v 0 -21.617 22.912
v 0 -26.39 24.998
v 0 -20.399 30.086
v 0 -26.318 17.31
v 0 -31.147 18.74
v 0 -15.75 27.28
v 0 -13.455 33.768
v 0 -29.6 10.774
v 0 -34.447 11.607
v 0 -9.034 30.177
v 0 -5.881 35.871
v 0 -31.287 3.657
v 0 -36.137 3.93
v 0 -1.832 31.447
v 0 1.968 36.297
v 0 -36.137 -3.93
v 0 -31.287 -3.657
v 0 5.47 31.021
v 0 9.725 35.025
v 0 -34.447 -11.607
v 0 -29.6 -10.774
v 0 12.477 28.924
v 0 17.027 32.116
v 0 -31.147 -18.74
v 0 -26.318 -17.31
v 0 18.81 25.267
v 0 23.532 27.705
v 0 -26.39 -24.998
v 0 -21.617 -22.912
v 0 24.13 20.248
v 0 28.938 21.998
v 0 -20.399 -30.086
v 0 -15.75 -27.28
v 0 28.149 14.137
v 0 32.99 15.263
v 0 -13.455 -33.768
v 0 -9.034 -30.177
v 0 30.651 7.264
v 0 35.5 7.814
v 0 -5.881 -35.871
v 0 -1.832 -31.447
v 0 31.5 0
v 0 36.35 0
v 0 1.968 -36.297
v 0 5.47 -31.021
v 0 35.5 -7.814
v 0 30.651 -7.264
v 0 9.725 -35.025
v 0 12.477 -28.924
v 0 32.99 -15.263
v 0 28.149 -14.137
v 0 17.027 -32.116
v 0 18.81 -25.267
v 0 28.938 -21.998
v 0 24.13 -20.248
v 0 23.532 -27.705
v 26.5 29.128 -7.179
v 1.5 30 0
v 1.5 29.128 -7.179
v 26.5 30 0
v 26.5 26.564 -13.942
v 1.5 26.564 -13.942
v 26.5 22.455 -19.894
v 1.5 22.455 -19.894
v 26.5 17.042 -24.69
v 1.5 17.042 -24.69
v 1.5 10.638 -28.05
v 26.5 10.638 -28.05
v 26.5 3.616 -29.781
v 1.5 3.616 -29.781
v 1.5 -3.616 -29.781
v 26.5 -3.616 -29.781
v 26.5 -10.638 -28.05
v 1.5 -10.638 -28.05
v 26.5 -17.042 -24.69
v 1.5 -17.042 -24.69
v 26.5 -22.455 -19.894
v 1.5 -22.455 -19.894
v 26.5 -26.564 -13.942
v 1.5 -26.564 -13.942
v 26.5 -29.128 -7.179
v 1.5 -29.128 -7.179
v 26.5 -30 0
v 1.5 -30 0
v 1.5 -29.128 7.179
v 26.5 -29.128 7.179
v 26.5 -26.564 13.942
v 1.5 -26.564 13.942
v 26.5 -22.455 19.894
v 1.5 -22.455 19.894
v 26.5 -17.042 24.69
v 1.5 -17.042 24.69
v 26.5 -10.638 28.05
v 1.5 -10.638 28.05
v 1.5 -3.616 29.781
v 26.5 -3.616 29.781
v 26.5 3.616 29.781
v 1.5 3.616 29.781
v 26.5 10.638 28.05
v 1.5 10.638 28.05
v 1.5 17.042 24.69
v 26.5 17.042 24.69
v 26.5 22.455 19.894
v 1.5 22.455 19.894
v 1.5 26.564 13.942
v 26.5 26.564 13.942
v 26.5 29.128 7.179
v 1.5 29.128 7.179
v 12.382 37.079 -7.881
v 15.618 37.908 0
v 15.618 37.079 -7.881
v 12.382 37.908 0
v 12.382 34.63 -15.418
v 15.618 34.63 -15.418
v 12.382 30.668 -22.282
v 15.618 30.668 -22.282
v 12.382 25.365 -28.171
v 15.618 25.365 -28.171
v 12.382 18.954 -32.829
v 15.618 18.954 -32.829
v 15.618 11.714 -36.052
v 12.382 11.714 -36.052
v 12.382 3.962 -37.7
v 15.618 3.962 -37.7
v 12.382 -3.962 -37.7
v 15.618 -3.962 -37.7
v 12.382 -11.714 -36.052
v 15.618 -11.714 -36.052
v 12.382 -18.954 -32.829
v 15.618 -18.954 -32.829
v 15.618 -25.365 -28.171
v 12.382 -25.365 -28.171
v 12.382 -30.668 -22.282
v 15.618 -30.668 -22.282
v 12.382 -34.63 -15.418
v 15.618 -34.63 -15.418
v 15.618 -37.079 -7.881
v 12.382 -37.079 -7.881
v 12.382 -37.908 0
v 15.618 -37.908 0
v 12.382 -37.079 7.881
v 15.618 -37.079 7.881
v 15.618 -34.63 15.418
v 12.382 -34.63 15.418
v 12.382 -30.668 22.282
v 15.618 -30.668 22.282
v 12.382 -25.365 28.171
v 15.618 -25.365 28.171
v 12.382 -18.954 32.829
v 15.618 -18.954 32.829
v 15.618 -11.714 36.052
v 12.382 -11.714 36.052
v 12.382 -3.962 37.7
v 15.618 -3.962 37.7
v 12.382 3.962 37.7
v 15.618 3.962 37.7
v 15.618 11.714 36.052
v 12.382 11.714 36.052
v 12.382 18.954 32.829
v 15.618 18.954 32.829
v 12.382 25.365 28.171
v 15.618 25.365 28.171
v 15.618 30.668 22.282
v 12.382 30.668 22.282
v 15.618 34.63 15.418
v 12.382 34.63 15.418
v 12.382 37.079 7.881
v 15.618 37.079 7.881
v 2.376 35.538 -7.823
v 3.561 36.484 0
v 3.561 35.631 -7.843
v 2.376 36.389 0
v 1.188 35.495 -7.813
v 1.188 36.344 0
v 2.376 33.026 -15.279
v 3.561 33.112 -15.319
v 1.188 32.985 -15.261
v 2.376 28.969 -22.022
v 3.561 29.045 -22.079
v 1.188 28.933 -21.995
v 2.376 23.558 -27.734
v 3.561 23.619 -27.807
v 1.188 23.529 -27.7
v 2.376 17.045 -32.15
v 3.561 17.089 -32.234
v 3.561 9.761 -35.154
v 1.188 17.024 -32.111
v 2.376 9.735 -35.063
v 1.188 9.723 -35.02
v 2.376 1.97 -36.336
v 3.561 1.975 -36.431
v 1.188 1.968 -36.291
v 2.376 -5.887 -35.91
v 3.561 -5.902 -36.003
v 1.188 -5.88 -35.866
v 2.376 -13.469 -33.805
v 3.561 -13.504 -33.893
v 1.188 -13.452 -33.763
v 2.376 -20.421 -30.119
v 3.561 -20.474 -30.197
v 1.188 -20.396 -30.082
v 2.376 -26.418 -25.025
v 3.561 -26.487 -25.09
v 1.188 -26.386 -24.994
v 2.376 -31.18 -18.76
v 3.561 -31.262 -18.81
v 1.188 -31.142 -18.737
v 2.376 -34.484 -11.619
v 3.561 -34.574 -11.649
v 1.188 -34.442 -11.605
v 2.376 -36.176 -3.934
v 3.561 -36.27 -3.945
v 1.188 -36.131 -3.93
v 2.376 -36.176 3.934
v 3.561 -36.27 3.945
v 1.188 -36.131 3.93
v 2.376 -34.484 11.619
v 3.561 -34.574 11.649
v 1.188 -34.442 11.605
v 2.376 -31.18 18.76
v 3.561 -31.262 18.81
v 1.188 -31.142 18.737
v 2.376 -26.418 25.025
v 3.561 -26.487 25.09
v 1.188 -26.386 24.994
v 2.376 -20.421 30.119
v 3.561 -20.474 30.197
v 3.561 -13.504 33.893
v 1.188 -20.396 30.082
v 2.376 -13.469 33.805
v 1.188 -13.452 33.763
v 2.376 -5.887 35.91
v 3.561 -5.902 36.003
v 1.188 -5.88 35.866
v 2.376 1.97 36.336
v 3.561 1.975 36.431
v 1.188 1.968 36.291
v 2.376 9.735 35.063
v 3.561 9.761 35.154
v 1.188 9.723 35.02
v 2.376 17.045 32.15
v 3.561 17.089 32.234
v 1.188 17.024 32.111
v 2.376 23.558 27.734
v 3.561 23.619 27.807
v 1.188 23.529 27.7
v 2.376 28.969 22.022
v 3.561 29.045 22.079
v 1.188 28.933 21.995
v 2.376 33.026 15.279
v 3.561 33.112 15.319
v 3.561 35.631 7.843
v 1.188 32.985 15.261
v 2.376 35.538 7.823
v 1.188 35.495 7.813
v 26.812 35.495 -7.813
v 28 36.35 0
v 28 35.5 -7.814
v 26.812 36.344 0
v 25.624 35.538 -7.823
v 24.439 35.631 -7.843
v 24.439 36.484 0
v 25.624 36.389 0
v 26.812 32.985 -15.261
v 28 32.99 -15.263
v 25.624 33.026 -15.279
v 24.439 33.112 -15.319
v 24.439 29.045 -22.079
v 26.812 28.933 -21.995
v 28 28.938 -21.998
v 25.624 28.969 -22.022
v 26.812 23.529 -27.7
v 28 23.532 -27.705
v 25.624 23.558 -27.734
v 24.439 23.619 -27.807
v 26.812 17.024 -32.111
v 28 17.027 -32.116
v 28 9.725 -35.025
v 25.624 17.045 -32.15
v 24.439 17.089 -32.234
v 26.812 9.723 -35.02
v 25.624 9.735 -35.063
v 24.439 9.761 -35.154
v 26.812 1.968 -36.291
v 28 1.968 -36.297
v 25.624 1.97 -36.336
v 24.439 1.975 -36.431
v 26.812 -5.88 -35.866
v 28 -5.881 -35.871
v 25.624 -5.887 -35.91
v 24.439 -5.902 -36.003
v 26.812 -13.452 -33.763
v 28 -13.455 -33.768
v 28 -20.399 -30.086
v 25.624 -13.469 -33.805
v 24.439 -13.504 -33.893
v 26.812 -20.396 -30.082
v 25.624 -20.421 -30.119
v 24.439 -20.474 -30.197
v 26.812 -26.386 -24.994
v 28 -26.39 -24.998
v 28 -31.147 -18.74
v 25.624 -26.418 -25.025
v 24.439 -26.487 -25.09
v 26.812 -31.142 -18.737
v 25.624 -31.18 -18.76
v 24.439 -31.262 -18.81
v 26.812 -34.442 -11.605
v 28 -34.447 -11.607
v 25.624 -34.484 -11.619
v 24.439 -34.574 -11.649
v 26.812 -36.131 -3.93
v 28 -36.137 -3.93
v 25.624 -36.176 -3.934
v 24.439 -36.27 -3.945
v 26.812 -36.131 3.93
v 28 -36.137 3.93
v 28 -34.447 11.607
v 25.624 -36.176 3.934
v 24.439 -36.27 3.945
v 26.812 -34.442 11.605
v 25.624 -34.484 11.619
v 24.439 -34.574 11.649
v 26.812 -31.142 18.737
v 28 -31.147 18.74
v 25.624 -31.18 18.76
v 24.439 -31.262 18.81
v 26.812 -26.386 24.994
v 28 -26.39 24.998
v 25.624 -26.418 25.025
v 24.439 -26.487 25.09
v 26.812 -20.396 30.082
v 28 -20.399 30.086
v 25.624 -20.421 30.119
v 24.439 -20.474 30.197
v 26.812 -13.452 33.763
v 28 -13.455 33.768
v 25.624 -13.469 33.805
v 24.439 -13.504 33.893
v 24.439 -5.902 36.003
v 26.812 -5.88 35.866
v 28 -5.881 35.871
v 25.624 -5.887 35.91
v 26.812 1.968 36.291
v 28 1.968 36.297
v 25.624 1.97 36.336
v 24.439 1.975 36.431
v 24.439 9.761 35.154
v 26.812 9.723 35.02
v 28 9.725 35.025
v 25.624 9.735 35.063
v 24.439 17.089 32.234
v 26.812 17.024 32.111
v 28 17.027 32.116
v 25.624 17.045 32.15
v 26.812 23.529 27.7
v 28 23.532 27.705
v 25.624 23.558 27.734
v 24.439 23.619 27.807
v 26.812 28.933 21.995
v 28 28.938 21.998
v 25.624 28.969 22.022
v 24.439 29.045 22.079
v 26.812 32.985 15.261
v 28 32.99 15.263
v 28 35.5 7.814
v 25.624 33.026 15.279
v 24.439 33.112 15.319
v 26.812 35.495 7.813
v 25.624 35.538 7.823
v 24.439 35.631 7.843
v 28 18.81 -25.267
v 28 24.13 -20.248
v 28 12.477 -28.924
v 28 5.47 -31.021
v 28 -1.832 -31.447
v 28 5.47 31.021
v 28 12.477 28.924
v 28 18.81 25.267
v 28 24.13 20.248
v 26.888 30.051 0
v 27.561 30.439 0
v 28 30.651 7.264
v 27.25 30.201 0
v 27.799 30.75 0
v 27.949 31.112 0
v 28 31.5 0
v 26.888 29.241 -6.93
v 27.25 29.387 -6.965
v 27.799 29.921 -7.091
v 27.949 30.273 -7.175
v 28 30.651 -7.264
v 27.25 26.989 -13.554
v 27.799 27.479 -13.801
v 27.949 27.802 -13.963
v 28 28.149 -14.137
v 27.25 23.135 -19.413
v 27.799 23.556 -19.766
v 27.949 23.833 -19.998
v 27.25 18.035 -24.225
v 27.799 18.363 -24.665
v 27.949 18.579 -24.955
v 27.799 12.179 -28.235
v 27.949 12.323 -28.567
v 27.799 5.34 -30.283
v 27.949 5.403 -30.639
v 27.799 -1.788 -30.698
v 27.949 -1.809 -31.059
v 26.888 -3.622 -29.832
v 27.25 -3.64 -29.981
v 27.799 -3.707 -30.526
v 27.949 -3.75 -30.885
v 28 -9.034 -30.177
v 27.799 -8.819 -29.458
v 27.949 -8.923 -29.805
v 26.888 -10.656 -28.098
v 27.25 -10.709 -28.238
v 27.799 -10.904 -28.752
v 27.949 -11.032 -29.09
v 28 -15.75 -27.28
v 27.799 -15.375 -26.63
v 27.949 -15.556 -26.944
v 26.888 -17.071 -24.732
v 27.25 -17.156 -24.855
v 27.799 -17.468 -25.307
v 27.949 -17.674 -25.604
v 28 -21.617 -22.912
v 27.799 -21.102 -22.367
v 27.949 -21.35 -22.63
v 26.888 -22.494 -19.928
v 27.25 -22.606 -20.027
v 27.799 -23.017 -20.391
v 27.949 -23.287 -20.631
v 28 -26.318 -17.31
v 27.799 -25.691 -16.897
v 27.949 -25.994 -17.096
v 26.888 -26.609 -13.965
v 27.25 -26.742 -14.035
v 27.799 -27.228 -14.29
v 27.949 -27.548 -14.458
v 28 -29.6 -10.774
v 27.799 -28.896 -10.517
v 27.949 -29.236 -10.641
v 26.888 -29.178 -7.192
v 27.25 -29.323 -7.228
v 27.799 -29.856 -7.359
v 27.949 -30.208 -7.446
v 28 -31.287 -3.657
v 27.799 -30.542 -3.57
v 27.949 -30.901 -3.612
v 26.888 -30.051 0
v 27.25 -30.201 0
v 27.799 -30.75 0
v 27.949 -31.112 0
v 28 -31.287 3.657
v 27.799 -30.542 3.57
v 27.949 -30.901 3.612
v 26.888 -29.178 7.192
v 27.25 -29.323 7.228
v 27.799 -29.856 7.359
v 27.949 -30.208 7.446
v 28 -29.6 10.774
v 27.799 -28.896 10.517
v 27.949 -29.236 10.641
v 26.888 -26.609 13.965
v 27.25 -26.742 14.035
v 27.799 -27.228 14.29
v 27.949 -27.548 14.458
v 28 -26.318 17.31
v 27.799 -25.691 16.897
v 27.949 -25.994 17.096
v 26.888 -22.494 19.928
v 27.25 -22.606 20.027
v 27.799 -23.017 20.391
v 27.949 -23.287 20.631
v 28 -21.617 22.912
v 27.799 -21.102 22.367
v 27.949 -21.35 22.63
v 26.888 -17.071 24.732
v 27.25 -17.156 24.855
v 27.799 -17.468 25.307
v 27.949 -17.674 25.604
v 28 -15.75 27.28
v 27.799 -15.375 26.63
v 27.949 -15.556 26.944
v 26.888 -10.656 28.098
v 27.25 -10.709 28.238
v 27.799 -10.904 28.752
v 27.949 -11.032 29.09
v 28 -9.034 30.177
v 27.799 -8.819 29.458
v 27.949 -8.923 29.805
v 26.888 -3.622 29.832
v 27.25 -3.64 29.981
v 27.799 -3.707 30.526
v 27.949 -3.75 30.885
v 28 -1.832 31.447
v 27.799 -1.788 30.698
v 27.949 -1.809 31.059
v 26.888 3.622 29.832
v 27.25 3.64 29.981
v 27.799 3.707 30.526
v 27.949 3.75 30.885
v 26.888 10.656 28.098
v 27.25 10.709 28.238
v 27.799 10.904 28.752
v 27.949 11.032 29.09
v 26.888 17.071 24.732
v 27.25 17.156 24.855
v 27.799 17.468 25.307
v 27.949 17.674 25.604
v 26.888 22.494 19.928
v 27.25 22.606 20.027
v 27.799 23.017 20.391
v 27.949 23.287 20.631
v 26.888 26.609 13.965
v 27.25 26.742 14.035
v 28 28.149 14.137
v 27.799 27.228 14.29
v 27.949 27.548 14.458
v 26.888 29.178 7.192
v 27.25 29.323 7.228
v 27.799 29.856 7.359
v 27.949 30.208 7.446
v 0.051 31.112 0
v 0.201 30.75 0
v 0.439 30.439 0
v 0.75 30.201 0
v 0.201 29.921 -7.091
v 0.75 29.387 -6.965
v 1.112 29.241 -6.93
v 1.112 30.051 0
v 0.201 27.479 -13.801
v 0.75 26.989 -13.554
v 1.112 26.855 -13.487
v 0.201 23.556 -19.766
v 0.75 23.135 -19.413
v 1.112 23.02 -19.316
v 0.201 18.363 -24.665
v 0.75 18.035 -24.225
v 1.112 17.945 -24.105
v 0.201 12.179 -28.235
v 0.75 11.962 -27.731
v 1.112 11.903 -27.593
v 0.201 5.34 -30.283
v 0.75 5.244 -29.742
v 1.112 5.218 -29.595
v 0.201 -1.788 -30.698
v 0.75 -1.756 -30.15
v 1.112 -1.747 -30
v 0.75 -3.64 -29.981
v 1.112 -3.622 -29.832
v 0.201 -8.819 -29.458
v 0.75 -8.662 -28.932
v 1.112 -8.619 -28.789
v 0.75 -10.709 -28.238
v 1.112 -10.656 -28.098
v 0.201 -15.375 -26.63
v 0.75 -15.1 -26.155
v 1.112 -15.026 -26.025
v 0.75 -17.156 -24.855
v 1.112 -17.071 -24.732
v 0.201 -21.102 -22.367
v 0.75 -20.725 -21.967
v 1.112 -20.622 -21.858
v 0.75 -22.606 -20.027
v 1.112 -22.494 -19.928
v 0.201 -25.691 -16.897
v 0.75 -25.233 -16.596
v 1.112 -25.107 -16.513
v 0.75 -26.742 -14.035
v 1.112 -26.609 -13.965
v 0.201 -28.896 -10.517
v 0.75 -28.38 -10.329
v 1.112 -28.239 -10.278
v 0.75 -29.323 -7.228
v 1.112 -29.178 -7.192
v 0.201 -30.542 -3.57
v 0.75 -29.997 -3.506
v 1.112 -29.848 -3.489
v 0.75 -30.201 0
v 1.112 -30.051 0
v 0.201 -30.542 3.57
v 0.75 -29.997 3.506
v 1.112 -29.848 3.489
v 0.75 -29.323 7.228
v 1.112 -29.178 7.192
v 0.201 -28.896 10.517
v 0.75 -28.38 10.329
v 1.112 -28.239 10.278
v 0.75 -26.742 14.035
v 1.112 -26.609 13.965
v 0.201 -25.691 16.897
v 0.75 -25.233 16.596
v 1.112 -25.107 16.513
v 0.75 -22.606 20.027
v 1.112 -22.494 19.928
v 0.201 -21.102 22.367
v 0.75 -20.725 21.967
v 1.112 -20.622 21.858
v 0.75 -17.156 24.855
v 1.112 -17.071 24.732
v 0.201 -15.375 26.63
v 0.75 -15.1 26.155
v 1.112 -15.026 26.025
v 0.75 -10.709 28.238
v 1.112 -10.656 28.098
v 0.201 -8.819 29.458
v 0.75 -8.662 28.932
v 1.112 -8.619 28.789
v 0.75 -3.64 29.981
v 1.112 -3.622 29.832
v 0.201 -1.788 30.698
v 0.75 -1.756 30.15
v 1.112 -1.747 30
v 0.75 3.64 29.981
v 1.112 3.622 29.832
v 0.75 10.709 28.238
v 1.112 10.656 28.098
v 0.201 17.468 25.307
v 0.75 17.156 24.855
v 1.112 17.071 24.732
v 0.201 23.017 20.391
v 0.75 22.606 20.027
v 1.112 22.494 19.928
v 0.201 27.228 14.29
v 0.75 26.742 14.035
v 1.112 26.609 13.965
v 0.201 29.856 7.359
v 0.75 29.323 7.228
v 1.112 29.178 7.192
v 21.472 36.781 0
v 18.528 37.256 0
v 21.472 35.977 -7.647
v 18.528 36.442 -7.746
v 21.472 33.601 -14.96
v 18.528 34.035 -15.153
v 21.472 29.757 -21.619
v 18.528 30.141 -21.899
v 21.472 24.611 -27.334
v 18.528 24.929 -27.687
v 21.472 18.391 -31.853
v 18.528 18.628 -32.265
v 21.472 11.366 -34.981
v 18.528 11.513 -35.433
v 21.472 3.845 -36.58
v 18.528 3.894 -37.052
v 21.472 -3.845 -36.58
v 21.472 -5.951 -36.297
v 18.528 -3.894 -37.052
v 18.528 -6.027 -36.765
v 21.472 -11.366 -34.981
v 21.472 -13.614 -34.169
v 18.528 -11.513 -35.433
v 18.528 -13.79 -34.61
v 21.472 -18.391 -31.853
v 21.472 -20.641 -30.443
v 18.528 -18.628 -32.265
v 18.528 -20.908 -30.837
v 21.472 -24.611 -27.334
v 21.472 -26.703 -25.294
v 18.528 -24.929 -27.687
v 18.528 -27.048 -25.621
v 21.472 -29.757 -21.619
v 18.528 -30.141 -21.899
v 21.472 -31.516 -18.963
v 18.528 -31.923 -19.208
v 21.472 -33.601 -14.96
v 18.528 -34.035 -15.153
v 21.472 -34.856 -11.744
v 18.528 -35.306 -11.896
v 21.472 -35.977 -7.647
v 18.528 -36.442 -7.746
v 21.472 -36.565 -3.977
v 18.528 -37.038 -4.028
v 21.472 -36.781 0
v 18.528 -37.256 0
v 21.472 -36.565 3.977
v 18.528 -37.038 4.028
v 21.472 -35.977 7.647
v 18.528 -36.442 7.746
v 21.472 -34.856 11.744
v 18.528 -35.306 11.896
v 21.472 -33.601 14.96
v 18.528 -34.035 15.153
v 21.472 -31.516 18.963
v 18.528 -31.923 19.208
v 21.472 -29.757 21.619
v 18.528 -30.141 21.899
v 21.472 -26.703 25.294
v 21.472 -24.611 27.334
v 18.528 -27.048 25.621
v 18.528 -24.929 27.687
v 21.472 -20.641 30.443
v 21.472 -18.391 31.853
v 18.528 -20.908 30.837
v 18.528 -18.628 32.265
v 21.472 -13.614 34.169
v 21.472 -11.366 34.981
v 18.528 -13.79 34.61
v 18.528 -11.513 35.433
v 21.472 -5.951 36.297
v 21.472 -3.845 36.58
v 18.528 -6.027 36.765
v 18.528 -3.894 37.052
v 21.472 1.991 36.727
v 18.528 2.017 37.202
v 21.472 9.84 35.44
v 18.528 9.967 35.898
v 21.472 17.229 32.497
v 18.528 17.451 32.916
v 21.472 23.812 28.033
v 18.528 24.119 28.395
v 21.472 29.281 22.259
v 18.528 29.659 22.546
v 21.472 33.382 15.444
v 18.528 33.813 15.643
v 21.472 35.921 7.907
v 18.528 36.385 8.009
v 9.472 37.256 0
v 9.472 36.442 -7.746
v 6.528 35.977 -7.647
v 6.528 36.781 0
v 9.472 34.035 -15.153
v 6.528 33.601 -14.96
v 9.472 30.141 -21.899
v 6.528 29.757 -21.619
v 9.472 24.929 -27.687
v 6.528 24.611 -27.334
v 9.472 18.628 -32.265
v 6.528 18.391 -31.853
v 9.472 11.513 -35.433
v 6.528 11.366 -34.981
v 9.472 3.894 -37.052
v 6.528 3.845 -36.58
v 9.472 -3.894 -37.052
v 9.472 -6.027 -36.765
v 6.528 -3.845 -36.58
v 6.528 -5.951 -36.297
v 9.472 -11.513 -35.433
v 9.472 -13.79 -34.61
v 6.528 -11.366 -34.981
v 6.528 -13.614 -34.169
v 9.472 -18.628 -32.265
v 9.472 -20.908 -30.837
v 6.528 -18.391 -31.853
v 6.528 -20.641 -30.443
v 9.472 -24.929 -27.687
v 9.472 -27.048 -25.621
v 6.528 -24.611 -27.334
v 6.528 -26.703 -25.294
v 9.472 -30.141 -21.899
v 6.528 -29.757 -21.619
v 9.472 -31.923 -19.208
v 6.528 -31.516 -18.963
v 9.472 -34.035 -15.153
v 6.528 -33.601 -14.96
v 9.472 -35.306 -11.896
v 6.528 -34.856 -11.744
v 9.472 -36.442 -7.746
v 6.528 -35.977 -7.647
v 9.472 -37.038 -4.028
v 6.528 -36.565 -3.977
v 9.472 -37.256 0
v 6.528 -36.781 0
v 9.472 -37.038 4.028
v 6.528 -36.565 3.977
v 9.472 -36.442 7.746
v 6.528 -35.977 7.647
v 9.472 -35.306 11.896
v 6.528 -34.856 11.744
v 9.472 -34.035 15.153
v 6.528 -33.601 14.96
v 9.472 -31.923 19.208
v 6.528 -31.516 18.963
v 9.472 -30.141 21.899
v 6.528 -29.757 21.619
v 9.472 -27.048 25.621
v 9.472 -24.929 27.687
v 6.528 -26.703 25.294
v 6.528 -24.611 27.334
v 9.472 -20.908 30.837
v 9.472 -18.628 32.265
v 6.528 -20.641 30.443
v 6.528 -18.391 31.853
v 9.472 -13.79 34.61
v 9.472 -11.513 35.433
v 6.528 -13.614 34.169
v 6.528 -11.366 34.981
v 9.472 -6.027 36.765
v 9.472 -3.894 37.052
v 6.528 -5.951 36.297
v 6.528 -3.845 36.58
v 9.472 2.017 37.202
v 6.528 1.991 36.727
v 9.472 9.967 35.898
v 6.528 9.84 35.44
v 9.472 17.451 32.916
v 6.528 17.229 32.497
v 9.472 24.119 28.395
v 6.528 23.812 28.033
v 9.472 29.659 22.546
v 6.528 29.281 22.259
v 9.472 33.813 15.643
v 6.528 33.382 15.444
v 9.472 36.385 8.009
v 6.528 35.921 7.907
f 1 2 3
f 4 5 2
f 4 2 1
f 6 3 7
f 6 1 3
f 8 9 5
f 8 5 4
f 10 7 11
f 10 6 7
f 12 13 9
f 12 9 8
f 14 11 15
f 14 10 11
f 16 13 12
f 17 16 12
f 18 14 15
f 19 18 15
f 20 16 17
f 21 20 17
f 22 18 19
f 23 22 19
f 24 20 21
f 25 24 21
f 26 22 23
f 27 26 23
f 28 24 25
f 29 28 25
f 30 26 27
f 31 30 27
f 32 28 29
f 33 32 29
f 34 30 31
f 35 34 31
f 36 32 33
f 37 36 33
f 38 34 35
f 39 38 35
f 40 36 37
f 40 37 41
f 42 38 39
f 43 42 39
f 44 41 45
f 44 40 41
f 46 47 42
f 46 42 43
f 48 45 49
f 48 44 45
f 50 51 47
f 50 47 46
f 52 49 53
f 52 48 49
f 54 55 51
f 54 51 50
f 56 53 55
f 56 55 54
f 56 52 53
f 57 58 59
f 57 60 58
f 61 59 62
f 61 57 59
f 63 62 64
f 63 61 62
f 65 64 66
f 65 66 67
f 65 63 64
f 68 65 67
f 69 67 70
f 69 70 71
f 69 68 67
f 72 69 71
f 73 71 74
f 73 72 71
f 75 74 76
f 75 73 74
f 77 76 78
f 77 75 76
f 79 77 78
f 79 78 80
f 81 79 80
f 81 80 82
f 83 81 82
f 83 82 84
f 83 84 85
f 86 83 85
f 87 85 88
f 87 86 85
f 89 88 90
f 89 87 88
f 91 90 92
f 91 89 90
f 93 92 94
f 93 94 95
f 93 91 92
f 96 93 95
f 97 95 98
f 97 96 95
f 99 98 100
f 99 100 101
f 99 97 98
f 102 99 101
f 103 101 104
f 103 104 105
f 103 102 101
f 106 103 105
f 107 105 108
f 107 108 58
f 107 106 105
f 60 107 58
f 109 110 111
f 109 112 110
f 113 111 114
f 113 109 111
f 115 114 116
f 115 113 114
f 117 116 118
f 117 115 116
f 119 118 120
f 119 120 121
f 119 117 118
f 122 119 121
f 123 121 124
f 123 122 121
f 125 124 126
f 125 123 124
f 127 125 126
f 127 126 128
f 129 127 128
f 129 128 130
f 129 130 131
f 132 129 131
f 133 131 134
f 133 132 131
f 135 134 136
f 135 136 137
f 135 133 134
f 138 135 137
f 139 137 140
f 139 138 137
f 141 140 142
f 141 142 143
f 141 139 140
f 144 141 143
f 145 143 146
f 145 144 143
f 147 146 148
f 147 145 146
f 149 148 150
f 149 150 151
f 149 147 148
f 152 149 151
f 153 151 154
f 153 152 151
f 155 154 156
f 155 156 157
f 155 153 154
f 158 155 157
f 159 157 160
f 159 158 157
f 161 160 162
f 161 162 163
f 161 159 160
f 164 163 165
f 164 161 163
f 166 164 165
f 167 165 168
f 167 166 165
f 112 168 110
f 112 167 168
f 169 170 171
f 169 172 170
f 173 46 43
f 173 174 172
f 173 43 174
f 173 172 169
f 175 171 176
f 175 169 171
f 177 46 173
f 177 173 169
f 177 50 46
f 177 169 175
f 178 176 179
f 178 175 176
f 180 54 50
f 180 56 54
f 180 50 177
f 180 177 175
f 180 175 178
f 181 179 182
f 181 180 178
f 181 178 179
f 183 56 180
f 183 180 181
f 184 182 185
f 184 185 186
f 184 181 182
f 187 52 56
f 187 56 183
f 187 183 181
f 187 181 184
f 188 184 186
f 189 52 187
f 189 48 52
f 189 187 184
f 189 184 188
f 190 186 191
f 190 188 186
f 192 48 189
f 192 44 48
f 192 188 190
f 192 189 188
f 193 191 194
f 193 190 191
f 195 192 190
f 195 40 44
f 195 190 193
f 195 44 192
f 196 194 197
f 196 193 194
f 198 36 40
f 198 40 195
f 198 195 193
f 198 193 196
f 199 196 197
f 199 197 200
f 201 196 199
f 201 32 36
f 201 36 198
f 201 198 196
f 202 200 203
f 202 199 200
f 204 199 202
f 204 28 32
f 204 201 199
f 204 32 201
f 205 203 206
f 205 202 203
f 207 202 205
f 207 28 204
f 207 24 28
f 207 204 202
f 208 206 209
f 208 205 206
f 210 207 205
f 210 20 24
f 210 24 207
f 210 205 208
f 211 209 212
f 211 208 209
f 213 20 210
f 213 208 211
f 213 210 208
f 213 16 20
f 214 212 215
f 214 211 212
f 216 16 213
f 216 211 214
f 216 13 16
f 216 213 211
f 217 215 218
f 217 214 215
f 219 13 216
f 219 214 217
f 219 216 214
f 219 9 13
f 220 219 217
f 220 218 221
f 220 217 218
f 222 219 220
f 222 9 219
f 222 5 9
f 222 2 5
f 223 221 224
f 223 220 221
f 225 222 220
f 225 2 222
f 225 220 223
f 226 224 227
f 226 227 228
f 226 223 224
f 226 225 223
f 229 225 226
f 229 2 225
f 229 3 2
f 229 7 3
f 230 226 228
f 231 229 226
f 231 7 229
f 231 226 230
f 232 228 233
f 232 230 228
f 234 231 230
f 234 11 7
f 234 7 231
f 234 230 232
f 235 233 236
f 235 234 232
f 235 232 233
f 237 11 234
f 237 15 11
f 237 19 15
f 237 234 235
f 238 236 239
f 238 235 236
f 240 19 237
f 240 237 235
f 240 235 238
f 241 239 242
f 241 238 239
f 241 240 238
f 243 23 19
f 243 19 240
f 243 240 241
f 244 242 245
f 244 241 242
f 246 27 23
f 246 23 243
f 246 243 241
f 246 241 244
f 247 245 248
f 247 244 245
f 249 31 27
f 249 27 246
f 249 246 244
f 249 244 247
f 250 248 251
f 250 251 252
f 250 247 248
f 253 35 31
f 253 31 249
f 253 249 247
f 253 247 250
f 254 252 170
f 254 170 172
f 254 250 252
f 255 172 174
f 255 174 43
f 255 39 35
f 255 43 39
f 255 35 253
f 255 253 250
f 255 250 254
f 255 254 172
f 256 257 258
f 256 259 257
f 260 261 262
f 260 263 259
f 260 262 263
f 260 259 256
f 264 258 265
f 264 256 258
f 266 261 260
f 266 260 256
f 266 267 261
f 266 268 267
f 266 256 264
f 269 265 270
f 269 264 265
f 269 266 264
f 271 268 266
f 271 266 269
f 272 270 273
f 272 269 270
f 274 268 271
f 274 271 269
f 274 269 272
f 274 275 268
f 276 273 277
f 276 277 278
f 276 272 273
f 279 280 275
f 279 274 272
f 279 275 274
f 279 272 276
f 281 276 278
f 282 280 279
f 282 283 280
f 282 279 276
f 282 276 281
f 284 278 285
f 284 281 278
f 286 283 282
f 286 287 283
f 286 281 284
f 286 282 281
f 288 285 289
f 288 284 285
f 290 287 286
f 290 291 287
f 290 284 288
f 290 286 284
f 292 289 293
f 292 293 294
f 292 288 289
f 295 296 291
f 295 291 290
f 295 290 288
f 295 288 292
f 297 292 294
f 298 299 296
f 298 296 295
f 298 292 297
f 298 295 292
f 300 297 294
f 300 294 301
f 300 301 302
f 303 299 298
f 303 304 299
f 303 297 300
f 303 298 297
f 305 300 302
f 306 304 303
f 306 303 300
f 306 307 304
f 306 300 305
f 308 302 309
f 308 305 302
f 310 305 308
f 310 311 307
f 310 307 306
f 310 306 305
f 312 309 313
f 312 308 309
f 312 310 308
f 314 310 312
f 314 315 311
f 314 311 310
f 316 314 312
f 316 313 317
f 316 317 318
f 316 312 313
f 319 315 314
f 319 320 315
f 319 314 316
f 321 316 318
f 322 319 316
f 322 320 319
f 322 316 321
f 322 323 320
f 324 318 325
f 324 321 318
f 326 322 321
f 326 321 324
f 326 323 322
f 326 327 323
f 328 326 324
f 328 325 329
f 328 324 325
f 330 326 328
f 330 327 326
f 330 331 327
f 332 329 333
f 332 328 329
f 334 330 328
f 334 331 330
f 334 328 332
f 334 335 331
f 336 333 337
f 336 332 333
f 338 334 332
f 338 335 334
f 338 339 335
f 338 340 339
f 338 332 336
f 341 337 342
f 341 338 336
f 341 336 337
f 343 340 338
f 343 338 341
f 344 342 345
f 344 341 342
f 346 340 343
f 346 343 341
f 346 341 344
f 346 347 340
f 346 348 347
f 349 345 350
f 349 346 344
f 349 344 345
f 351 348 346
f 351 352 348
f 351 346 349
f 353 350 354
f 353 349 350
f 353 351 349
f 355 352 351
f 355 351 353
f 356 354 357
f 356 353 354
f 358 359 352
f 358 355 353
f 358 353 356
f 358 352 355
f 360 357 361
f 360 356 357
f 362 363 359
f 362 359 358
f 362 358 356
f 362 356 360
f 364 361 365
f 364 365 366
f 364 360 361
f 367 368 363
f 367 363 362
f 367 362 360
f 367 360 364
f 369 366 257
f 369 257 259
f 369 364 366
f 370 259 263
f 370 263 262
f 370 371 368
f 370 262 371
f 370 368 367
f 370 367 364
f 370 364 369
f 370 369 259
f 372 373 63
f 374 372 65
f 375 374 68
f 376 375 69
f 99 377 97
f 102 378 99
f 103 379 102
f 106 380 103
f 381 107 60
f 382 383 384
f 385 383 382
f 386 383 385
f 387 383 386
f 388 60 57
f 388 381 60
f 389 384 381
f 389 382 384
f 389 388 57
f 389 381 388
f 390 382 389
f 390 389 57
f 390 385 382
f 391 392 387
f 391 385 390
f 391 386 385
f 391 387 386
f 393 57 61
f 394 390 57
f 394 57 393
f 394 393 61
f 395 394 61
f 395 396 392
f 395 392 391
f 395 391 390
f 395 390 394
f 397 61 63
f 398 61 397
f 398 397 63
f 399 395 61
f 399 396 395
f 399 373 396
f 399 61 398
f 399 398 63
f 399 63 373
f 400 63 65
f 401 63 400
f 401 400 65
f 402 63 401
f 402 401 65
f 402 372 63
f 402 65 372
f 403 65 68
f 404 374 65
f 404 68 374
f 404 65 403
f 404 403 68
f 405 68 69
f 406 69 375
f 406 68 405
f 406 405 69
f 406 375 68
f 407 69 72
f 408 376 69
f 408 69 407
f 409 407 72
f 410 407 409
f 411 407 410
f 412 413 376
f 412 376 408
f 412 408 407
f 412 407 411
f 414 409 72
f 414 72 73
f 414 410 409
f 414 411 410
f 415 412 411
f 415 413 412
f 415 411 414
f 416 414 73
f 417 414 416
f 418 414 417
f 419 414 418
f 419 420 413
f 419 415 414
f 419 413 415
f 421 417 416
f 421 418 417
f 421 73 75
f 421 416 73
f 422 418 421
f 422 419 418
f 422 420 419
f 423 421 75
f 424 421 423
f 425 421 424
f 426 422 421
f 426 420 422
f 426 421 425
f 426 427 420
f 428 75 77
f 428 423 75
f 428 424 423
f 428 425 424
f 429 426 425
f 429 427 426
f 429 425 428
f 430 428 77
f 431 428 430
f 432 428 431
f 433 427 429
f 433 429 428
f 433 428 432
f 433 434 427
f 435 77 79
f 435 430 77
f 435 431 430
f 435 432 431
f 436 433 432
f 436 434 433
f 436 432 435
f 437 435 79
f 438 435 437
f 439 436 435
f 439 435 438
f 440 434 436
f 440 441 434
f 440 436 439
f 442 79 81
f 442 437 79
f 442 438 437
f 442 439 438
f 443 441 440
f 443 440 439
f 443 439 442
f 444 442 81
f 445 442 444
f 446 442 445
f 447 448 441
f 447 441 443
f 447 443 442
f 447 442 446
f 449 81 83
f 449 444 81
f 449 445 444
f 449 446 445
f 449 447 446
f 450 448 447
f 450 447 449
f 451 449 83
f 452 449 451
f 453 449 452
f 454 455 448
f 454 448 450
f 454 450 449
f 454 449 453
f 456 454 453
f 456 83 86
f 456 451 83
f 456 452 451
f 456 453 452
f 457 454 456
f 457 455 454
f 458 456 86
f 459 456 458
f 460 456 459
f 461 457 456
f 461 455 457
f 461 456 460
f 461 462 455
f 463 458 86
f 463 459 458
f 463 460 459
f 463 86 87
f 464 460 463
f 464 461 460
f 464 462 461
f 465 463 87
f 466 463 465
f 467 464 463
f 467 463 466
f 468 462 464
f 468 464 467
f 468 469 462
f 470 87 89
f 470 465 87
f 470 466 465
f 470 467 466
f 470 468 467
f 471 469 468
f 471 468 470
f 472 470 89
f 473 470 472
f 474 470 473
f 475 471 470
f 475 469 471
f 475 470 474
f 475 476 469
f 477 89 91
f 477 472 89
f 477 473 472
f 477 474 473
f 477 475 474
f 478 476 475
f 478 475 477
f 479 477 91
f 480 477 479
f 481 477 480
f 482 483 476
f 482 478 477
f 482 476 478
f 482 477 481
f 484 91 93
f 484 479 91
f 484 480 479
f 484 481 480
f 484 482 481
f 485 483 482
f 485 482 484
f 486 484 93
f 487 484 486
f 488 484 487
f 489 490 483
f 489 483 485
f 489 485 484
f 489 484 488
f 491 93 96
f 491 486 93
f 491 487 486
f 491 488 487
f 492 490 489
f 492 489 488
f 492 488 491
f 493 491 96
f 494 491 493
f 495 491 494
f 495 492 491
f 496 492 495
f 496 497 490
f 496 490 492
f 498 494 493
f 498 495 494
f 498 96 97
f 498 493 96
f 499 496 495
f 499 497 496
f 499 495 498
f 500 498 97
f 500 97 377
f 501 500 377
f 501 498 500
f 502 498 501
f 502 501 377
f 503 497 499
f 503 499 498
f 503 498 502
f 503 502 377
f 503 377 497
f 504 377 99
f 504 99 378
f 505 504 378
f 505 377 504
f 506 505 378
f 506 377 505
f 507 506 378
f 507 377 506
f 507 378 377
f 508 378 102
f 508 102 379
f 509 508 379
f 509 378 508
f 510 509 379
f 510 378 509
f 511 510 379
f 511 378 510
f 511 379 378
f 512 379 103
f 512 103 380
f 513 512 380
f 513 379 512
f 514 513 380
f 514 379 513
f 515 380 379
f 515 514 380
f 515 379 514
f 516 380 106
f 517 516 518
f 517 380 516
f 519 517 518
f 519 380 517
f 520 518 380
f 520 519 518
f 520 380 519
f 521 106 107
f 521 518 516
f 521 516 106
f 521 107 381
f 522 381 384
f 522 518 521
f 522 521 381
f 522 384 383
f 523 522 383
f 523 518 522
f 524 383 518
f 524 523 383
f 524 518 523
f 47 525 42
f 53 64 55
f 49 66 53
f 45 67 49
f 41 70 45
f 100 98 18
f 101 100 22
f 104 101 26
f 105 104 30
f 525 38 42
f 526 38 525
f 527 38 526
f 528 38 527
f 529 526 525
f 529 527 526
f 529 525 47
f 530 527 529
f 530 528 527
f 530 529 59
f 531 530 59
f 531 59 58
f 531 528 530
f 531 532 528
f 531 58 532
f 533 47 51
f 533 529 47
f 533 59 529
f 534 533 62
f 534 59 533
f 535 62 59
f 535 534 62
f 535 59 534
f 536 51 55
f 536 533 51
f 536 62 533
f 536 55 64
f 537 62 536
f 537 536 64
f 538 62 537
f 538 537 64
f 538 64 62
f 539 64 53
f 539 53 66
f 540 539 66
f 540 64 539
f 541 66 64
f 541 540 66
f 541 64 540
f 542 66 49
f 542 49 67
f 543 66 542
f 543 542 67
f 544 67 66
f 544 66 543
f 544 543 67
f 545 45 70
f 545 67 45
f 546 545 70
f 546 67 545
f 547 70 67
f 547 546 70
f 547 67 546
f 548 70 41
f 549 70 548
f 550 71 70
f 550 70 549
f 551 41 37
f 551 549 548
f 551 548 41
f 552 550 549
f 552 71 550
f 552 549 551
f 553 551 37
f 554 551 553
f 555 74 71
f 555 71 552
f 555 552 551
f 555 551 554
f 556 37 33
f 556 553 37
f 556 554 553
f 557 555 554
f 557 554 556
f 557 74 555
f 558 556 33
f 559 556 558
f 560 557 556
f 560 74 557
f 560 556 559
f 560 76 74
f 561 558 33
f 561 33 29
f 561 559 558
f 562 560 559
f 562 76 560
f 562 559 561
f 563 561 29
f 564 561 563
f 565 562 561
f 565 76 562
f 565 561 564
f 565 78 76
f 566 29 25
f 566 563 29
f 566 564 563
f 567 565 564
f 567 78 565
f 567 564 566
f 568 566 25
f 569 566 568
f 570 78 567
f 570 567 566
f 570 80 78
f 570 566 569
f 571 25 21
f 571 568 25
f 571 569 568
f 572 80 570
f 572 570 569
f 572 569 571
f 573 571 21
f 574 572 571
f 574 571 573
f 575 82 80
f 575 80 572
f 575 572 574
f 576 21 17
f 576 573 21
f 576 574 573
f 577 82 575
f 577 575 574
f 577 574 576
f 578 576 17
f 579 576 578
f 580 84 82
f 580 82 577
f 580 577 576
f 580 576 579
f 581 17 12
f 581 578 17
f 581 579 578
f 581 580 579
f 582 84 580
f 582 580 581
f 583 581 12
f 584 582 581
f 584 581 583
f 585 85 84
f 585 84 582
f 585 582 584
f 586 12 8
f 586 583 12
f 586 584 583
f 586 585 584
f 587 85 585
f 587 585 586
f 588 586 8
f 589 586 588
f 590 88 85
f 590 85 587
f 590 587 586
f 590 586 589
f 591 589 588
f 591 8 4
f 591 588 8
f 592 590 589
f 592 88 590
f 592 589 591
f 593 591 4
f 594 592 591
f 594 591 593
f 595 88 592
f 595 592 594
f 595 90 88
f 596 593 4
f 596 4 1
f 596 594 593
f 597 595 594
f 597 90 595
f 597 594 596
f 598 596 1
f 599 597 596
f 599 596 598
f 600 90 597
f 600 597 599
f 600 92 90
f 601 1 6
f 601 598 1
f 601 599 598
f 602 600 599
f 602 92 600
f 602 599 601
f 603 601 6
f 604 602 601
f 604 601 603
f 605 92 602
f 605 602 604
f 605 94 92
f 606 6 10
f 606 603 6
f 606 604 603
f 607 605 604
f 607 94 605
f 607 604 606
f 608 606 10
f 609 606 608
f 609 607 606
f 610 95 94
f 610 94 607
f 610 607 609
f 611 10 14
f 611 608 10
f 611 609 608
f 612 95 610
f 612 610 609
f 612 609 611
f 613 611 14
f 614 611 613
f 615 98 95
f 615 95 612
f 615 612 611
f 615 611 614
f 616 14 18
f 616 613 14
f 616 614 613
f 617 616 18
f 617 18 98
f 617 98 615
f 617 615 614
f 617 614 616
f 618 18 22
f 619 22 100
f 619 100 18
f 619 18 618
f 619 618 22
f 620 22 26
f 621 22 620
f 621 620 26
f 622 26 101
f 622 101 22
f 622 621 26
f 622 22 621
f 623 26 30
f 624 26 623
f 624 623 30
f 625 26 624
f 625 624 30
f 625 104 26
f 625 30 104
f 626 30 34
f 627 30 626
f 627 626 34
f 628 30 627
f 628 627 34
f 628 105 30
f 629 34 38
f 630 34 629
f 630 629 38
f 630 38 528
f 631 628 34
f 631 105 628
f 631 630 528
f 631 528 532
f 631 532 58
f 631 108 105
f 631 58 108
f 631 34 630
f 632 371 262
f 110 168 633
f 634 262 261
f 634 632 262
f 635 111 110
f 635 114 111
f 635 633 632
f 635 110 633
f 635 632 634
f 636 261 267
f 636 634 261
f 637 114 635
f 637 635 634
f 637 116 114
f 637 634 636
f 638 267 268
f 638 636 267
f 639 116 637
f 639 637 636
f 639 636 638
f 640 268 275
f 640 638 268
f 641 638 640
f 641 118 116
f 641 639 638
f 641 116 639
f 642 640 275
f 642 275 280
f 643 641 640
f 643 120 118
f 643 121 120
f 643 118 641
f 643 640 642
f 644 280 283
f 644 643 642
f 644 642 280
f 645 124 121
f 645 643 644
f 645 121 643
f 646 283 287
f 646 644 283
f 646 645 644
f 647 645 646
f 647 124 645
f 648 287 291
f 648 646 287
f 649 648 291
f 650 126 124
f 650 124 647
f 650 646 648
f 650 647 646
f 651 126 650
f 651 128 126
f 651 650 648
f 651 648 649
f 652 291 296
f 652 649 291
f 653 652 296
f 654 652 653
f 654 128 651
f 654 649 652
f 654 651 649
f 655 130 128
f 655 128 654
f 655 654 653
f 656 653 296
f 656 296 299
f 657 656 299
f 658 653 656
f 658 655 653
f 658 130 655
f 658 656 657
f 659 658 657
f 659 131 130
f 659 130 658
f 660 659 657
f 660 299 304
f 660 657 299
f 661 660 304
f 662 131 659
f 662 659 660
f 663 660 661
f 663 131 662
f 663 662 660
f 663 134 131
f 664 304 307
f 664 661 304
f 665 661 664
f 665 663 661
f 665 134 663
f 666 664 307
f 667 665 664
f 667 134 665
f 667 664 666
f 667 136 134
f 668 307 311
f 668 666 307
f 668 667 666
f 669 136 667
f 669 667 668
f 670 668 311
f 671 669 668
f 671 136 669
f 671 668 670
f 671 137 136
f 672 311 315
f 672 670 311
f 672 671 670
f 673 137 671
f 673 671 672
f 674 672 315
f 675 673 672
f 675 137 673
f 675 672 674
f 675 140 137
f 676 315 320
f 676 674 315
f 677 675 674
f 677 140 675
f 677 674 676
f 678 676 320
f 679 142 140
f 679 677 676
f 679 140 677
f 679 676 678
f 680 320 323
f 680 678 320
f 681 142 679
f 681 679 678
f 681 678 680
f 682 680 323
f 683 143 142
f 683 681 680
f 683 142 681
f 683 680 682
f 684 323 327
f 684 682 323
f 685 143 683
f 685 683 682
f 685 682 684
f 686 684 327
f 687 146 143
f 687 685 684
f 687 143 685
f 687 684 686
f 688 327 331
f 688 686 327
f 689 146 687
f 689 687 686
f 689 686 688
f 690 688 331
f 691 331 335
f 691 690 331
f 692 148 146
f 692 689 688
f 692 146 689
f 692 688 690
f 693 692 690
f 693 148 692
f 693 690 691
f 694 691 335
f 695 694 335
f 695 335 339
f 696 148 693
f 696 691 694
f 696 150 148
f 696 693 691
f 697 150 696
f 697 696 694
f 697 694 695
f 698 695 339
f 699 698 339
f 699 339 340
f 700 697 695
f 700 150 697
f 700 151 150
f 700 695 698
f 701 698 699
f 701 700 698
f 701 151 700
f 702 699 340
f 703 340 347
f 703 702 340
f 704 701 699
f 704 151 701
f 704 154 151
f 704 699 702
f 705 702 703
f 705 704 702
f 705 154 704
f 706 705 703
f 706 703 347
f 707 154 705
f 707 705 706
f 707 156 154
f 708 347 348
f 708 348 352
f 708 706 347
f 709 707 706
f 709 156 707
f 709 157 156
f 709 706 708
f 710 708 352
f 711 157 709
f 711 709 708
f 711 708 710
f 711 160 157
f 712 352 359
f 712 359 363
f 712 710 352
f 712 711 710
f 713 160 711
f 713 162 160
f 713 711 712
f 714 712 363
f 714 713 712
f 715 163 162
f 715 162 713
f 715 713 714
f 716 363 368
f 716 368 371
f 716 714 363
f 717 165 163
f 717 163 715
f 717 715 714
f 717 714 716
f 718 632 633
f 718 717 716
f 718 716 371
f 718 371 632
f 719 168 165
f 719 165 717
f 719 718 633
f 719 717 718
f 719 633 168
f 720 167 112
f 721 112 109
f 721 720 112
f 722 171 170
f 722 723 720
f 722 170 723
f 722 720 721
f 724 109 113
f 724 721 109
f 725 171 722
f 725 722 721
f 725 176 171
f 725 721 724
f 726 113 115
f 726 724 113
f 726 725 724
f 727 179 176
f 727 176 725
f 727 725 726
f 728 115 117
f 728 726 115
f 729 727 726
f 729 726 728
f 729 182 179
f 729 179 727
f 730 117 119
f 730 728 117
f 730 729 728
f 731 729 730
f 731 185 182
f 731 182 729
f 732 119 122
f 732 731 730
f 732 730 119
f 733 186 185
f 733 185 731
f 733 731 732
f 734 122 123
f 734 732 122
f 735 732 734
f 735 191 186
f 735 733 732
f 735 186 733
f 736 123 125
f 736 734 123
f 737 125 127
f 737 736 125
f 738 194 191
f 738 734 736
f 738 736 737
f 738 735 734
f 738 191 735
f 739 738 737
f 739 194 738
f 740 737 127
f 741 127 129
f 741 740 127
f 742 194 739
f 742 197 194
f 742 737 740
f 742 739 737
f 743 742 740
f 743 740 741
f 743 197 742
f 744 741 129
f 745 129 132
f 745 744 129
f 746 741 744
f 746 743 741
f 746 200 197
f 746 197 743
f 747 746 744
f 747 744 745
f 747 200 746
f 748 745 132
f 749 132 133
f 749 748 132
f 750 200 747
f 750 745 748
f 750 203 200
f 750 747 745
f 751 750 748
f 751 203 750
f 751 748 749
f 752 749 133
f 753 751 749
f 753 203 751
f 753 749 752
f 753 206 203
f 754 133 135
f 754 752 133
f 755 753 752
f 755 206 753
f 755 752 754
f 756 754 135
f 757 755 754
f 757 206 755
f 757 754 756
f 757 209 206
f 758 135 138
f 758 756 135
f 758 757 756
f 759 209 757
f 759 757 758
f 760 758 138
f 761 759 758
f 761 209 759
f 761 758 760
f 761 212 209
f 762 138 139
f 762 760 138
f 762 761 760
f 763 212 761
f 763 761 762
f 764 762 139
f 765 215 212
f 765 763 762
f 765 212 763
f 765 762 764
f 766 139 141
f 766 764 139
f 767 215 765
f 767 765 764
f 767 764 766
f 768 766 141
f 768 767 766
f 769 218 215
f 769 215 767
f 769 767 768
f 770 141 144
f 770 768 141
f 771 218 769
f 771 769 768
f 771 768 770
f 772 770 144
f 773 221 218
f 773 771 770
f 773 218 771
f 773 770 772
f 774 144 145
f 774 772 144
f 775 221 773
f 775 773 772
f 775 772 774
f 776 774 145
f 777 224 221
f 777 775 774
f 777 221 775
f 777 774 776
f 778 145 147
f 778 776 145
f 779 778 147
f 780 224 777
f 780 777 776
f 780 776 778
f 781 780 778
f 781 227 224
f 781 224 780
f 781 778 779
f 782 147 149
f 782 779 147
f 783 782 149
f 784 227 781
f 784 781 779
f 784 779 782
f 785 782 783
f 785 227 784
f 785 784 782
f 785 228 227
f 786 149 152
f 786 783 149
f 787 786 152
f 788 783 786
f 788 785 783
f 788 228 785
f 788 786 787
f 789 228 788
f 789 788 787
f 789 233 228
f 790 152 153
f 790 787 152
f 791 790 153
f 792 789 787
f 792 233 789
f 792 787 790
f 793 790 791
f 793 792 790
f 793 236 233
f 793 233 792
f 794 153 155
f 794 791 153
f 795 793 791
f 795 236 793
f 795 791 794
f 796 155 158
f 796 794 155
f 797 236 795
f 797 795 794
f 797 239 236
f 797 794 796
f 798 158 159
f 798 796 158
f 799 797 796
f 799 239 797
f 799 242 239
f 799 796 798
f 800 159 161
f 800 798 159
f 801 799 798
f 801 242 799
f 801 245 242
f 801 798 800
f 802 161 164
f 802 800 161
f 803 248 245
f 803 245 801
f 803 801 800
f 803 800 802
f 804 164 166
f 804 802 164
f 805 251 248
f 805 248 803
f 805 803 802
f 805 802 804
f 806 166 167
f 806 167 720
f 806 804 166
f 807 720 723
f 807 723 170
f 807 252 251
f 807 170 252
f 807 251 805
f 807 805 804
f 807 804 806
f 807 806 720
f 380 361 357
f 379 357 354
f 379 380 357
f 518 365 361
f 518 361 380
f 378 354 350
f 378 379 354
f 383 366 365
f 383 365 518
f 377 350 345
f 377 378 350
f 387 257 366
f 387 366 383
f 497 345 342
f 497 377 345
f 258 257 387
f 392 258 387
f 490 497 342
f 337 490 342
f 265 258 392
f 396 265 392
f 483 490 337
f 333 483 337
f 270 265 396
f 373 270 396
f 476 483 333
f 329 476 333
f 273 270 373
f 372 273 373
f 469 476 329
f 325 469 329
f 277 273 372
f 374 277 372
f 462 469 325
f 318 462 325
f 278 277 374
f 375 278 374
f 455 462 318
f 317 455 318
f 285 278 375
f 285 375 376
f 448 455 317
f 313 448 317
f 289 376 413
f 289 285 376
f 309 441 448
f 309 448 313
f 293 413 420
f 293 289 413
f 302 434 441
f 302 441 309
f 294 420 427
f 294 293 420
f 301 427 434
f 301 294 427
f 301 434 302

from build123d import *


with BuildPart() as part:
    # Sketch1 → Revolve1 (revolve)
    with BuildSketch(Plane.XY):
        with BuildLine():
            Line((1.5, 30), (26.5, 30))
            ThreePointArc((26.5, 30), (27.560660172, 30.439339828), (28, 31.5))
            Line((28, 31.5), (28, 36.35))
            ThreePointArc((28, 36.35), (26.217439951, 36.360351084), (24.439151002, 36.484108463))
            ThreePointArc((24.439151002, 36.484108463), (19.996363113, 36.996457171), (15.617923853, 37.907574657))
            Line((15.617923853, 37.907574657), (12.382076147, 37.907574657))
            ThreePointArc((12.382076147, 37.907574657), (8.003636887, 36.996457171), (3.560848998, 36.484108463))
            ThreePointArc((3.560848998, 36.484108463), (1.782560049, 36.360351084), (0, 36.35))
            Line((0, 36.35), (0, 31.5))
            ThreePointArc((0, 31.5), (0.439339828, 30.439339828), (1.5, 30))
        make_face()
    revolve(axis=Axis((28, 0, 0), (-1, 0, 0)))


solid = part.part
